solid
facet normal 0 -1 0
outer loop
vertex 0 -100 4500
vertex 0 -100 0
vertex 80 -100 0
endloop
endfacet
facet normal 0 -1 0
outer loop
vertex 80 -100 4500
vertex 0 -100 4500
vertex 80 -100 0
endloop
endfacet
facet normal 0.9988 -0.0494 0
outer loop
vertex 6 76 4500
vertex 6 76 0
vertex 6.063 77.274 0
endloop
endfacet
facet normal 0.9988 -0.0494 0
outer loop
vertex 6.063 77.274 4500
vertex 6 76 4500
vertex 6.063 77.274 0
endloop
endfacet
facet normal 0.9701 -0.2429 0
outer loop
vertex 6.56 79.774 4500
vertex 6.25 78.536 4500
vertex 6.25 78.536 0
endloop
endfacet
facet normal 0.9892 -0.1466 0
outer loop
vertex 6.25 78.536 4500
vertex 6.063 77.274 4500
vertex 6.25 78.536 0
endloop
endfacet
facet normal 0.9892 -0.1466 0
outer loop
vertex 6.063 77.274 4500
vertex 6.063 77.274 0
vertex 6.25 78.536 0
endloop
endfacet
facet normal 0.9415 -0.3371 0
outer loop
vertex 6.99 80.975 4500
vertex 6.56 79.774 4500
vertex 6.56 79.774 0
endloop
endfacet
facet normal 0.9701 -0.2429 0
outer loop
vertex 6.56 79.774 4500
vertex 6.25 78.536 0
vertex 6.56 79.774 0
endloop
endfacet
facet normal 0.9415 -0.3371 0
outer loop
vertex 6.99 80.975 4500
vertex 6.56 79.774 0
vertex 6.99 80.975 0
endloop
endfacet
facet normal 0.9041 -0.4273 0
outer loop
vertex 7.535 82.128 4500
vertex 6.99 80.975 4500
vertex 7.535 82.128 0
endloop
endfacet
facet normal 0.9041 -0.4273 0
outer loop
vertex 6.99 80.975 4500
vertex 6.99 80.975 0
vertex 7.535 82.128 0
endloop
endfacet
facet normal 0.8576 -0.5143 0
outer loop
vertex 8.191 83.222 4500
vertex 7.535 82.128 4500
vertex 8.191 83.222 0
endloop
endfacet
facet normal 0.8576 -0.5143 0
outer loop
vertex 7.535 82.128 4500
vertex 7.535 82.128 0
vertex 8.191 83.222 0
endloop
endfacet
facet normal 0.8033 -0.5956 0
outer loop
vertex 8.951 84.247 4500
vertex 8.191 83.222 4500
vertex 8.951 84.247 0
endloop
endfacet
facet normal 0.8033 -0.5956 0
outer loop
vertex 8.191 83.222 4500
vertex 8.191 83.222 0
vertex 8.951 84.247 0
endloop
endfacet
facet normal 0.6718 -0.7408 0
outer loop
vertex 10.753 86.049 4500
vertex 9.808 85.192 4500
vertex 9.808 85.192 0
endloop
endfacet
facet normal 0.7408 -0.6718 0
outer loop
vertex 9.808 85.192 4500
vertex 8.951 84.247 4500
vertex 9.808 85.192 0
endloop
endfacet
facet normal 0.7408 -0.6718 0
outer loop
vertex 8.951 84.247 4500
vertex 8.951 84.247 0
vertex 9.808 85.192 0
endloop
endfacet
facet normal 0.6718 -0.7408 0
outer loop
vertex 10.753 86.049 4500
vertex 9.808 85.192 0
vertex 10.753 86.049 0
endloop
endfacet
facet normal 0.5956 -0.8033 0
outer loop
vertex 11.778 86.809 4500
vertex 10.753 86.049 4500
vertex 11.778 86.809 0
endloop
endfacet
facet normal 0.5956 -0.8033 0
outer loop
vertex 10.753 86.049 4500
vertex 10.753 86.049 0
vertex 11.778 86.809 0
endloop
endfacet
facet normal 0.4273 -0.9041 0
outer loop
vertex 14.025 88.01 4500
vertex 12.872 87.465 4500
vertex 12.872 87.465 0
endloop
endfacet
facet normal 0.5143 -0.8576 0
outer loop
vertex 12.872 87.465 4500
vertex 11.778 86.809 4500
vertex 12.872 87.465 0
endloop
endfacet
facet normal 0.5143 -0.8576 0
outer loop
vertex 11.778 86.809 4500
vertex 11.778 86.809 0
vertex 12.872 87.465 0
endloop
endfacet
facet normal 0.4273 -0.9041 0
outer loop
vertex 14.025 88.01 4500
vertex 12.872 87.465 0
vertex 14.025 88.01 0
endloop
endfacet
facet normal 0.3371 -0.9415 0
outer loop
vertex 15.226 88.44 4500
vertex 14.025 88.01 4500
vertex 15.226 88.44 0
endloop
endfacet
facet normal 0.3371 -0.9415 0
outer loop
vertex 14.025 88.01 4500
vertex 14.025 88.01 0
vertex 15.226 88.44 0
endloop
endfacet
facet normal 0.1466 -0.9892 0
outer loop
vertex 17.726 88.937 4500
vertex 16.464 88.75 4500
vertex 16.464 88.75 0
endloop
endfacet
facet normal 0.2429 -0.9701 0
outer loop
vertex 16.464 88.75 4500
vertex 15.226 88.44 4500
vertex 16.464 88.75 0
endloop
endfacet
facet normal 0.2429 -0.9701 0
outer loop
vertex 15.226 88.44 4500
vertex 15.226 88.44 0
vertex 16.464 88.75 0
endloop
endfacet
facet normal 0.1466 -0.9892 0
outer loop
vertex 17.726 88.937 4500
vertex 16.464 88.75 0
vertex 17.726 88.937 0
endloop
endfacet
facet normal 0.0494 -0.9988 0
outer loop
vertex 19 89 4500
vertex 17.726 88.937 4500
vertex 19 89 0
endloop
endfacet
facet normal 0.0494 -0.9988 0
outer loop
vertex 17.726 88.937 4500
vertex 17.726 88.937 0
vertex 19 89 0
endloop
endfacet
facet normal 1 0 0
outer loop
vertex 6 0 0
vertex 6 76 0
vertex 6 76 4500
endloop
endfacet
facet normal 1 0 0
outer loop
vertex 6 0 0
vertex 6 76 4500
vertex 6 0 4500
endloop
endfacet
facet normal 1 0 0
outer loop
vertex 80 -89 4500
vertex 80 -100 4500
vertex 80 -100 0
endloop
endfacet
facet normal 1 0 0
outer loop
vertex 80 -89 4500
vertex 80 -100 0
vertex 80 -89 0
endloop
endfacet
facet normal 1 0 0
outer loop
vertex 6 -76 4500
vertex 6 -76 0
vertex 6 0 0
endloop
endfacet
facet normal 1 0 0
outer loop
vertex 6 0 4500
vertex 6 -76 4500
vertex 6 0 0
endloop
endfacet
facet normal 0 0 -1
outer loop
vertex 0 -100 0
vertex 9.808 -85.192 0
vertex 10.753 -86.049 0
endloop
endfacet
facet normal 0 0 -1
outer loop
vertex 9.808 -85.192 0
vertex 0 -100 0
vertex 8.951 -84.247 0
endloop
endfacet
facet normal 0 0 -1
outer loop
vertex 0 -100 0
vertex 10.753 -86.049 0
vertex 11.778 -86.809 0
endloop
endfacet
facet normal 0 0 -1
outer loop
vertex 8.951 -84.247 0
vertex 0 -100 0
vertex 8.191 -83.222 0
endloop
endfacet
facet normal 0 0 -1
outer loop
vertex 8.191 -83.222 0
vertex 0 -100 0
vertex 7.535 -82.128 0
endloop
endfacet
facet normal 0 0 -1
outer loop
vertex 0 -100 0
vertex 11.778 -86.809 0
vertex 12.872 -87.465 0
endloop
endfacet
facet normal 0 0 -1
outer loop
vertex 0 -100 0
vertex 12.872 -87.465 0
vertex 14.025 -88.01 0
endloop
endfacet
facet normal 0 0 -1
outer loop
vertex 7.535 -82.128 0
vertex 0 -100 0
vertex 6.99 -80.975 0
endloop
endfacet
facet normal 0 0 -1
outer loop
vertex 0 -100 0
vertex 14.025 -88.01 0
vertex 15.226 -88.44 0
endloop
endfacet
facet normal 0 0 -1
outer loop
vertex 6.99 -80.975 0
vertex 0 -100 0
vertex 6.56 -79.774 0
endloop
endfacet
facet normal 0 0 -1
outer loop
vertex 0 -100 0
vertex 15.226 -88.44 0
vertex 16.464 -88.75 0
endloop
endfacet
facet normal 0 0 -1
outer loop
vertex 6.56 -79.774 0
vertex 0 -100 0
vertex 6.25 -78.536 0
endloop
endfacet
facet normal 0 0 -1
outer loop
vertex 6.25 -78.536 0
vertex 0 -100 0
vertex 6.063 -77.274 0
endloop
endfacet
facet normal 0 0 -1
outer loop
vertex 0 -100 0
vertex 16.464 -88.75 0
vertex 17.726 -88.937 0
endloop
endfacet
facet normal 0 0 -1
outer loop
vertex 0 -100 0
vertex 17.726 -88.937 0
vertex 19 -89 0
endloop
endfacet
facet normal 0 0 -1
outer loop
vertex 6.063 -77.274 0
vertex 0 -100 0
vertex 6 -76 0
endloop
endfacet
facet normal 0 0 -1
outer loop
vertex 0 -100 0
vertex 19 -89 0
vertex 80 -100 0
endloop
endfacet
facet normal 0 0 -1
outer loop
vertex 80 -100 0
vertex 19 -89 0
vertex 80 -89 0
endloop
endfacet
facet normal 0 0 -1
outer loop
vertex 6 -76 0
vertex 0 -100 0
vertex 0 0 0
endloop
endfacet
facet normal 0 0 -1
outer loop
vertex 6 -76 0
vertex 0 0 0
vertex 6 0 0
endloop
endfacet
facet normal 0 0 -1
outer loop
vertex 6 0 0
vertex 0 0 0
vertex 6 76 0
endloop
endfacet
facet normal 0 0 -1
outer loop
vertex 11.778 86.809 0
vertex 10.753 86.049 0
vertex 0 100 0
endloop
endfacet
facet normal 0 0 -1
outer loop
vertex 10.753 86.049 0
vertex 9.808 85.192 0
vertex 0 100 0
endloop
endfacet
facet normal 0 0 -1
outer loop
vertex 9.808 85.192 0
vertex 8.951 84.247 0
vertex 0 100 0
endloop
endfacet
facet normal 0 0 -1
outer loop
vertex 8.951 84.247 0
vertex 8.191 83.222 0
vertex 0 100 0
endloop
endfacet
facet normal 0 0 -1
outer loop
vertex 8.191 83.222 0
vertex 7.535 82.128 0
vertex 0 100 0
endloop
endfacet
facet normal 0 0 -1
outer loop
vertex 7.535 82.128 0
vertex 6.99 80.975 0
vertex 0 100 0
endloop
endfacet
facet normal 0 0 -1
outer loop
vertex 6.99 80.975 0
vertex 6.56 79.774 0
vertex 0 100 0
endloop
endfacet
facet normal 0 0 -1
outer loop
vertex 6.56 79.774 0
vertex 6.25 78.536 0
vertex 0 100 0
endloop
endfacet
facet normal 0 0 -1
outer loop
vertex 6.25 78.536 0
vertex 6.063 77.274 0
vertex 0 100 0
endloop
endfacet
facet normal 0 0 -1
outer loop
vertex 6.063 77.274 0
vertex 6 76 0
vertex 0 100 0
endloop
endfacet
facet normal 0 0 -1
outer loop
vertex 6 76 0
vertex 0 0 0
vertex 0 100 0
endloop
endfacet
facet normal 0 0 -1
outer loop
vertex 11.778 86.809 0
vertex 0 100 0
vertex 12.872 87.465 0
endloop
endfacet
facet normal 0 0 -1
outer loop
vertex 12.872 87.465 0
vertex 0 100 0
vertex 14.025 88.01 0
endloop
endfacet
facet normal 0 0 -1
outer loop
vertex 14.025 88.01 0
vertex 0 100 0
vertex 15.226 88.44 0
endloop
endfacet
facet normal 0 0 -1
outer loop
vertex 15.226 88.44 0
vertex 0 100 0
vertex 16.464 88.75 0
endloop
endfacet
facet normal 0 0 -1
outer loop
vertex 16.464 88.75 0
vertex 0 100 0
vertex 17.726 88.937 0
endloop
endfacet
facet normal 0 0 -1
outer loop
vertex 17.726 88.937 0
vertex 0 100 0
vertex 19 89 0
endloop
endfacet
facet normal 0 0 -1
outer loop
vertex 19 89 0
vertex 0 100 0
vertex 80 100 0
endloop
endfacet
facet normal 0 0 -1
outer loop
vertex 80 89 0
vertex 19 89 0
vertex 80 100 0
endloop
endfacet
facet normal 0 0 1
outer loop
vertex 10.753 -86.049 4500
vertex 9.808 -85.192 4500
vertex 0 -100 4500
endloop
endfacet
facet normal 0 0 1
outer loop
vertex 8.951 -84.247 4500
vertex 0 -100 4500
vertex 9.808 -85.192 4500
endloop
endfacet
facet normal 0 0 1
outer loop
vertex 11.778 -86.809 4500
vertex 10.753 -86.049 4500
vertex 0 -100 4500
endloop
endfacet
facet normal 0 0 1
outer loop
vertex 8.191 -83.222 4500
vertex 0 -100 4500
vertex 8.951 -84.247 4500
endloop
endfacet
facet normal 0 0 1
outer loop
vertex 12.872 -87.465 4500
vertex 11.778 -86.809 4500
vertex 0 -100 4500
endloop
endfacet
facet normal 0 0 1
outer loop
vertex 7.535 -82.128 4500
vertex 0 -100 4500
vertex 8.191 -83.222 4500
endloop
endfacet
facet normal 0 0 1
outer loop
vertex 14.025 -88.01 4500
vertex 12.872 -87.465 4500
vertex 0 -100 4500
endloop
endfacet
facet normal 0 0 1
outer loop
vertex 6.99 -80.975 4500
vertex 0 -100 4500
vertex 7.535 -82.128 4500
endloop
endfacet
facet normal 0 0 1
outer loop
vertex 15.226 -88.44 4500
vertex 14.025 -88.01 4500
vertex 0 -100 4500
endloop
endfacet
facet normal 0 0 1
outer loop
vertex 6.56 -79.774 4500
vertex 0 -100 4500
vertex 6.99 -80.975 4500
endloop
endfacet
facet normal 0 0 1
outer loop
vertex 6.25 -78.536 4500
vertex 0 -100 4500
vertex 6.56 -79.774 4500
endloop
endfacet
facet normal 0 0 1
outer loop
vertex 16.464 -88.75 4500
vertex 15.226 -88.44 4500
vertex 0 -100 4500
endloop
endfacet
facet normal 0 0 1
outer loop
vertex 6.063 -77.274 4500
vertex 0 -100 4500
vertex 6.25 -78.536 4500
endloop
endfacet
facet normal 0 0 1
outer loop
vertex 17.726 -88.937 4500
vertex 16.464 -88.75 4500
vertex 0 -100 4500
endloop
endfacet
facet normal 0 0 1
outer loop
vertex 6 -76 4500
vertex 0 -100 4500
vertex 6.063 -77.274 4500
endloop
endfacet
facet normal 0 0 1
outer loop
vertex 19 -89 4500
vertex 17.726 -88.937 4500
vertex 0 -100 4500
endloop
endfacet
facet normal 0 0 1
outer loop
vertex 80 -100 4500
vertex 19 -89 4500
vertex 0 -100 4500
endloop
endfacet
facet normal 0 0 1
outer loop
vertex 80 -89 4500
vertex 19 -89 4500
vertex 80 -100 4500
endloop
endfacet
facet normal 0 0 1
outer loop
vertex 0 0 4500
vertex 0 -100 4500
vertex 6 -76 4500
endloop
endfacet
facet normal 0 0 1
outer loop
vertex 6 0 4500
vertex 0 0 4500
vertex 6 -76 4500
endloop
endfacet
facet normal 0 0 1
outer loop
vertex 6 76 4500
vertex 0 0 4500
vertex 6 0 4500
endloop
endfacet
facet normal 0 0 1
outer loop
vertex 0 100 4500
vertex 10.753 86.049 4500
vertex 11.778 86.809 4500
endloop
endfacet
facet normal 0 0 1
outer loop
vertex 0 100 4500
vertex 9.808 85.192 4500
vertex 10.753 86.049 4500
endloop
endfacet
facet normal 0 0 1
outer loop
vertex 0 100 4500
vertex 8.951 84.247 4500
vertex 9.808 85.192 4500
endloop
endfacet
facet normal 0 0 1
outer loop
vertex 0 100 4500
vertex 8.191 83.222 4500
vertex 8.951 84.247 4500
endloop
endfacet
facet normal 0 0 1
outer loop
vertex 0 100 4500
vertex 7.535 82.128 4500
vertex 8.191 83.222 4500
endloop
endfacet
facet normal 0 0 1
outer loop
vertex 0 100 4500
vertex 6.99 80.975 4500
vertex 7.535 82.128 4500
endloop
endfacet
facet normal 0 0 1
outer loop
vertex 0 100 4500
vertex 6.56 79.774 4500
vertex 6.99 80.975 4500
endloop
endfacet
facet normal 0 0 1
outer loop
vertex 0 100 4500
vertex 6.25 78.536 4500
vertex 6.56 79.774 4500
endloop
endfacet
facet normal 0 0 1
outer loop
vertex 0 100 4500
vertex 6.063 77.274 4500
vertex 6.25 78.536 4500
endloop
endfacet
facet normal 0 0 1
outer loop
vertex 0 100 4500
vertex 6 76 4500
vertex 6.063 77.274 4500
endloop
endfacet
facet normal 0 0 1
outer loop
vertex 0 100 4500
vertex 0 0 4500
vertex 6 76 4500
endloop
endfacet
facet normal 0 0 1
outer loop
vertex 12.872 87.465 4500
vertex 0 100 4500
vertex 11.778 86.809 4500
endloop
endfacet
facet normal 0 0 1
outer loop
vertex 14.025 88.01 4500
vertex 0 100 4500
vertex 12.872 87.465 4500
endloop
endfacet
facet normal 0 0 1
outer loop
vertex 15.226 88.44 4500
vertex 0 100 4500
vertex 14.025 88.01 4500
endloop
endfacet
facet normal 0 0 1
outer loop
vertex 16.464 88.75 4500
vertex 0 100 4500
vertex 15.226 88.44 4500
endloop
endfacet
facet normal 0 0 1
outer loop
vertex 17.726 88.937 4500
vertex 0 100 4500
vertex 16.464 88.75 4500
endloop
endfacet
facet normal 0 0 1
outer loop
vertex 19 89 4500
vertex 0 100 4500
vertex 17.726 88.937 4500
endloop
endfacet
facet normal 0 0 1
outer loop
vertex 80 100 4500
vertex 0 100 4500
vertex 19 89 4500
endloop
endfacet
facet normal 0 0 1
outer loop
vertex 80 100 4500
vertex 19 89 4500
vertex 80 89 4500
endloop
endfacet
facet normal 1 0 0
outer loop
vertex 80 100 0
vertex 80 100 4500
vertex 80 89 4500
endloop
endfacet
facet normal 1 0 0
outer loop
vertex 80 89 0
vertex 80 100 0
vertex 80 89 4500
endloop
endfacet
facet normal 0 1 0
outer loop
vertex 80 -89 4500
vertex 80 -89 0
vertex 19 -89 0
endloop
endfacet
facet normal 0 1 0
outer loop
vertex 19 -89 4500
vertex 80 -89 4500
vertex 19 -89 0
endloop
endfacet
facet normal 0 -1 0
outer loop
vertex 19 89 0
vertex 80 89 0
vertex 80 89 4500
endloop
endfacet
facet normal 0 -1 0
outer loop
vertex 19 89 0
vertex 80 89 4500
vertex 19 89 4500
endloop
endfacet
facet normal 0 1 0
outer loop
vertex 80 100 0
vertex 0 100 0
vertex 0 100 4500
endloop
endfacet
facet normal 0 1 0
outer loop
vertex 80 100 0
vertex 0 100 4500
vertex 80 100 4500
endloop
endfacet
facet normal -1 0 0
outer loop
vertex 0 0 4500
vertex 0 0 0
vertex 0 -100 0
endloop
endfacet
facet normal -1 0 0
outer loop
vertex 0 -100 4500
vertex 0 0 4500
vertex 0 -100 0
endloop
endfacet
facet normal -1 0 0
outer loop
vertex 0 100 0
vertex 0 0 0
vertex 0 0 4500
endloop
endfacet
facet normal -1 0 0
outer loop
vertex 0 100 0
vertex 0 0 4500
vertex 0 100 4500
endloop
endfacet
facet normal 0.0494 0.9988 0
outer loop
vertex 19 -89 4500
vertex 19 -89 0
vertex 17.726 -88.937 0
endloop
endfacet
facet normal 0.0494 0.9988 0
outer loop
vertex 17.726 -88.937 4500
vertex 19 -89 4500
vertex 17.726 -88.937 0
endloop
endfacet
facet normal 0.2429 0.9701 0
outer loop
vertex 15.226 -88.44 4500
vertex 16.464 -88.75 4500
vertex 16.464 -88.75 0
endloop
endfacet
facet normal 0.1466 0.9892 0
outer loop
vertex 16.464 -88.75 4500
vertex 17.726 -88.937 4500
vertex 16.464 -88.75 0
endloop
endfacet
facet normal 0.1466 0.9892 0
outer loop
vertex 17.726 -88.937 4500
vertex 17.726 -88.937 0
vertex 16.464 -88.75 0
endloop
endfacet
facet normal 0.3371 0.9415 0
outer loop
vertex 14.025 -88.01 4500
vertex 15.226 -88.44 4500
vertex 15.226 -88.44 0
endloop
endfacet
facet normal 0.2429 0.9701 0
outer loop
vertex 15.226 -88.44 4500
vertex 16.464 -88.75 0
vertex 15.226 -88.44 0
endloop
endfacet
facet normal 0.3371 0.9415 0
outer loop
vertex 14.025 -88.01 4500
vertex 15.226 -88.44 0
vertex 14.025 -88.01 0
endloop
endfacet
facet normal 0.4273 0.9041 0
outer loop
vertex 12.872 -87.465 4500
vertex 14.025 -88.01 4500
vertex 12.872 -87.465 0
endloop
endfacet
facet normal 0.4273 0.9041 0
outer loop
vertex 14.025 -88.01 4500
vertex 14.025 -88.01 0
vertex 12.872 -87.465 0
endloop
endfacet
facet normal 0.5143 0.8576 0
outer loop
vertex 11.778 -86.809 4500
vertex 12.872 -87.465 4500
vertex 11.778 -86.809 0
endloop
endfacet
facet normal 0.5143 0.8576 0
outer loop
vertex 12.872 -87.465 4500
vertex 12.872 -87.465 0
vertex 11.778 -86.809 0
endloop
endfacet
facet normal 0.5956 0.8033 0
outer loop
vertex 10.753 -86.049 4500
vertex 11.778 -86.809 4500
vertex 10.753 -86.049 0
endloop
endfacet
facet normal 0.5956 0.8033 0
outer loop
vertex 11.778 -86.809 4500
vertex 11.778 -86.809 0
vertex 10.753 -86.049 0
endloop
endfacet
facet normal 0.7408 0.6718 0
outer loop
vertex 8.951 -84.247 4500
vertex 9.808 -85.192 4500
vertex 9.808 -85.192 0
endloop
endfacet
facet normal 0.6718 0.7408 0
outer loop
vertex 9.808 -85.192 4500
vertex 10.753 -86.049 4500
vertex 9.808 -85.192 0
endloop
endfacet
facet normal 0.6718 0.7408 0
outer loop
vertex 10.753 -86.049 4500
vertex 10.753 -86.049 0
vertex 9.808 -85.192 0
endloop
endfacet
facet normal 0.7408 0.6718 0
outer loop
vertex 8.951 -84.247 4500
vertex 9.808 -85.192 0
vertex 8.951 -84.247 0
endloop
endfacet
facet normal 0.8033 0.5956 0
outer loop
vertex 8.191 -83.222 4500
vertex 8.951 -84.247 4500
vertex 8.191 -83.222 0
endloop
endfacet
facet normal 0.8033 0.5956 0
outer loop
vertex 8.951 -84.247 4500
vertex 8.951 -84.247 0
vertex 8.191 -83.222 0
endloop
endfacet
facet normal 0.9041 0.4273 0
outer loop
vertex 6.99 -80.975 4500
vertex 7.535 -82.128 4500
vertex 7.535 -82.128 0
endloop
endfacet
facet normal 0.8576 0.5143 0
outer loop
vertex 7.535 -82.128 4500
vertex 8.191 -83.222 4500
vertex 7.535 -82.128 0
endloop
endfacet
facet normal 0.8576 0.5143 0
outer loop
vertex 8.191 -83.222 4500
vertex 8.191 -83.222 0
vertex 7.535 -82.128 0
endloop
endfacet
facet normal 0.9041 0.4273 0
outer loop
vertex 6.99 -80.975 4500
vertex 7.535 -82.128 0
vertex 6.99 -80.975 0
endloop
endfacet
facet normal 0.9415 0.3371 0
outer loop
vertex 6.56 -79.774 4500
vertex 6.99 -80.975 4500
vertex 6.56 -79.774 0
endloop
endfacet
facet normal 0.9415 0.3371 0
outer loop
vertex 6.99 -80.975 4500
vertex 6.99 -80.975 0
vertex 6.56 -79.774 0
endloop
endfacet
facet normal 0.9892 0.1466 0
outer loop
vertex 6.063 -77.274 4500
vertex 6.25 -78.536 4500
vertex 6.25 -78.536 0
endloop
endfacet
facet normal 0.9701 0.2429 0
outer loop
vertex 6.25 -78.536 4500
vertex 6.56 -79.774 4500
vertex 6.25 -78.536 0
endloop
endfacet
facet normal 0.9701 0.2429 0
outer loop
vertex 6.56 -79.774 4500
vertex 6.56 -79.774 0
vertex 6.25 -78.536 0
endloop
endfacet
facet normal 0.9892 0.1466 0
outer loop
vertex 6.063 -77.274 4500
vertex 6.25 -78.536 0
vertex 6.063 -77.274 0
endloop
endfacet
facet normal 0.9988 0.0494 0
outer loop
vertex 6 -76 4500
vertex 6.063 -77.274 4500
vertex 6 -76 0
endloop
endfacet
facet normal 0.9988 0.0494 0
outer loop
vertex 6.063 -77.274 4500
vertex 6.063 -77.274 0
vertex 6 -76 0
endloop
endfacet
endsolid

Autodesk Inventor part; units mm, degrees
ref_plane "YZ Plane" through (0, 0, 0) normal (1, 0, 0) x (0, 1, 0)
ref_plane "Start plane" through (0, 0, 0) normal (0, 0, 1) x (1, 0, 0)
ref_plane "End plane" through (0, 0, 4500) normal (0, 0, 1) x (1, 0, 0)
sketch "Sketch" plane through (0, 0, 0) normal (0, 0, 1) x (1, 0, 0)
  line L0 (0, 0) -> (0, 100)
  line L1 (0, 100) -> (80, 100)
  line L2 (80, 100) -> (80, 89)
  line L3 (80, 89) -> (19, 89)
  line L4 (6, 76) -> (6, 0)
  line L5 (6, 0) -> (0, 0) construction
  line L6 (25.6, 100) -> (25.6, 89) construction
  line L7 (80, 89) -> (80, 89) construction
  line L8 (80, 89) -> (25.6, 89) construction
  line L9 (0, 12) -> (0, -30) construction
  line L10 (-1.5, 0) -> (19.5, 0) construction
  line L11 (0, 0) -> (0, -100)
  line L12 (0, -100) -> (80, -100)
  line L13 (80, -100) -> (80, -89)
  line L14 (80, -89) -> (19, -89)
  line L15 (6, -76) -> (6, 0)
  arc A0 (6, -76) -> (19, -89) centre (19, -76) ccw
  arc A1 (19, 89) -> (6, 76) centre (19, 76) ccw
  line L16 (0, 140) -> (0, -140) construction
  line L17 (-17.8, 0) -> (96.3, 0) construction
  point P0 (6, 89)
  point P1 (6, -89)
  point P2 (25.6, -100)
  point P3 (25.6, -89)
  dimension "d0" = 6
  dimension "d1" = 100
  dimension "d2" = 80
  dimension "d3" = 11
  dimension "d5" = 0
  dimension "d23" = 13
  dimension "d24" = 0
  dimension "d29" = 25.6
extrude "Body" add sketch "Sketch" along normal up to surface (4500 mm away) from surface at 0
sketch "Sketch3" plane through (0, 0, 0) normal (0, 0, 1) x (1, 0, 0)
  line L0 (0, 0) -> (10, 0)
ref_plane "Work Plane3" through (0, 0, 0) normal (0, -1, 0) x (1, 0, 0)
sketch "Sketch4" plane through (0, 0, 0) normal (0, -1, 0) x (1, 0, 0)
  line L0 (-2, 0) -> (12, 0)
  line L1 (-2, 4500) -> (12, 4500)
  dimension "d28" = 4500
equation "\"d0\" = G_T"
equation "\"d1\" = 0.5 * G_H"
equation "\"d2\" = G_W"
equation "\"d3\" = G_T1"
equation "\"d23\" = G_IR"
equation "\"d29\" = G_C"
equation "\"d6\" = G_L"
equation "\"G_W\" = 80"
equation "\"G_H\" = 200"
equation "\"G_T\" = 6"
equation "\"G_T1\" = 11"
equation "\"G_NG\" = 0"
equation "\"G_IR\" = 13"
equation "\"G_C\" = 25.6"
equation "\"G_L\" = d28"
equation "\"ex\" = 0"
equation "\"G_OFFSET_START\" = 0"
equation "\"G_OFFSET_END\" = 0"
properties part number "DIN 1026-2 - UPE 200 - 4500" material "Steel, Mild"
